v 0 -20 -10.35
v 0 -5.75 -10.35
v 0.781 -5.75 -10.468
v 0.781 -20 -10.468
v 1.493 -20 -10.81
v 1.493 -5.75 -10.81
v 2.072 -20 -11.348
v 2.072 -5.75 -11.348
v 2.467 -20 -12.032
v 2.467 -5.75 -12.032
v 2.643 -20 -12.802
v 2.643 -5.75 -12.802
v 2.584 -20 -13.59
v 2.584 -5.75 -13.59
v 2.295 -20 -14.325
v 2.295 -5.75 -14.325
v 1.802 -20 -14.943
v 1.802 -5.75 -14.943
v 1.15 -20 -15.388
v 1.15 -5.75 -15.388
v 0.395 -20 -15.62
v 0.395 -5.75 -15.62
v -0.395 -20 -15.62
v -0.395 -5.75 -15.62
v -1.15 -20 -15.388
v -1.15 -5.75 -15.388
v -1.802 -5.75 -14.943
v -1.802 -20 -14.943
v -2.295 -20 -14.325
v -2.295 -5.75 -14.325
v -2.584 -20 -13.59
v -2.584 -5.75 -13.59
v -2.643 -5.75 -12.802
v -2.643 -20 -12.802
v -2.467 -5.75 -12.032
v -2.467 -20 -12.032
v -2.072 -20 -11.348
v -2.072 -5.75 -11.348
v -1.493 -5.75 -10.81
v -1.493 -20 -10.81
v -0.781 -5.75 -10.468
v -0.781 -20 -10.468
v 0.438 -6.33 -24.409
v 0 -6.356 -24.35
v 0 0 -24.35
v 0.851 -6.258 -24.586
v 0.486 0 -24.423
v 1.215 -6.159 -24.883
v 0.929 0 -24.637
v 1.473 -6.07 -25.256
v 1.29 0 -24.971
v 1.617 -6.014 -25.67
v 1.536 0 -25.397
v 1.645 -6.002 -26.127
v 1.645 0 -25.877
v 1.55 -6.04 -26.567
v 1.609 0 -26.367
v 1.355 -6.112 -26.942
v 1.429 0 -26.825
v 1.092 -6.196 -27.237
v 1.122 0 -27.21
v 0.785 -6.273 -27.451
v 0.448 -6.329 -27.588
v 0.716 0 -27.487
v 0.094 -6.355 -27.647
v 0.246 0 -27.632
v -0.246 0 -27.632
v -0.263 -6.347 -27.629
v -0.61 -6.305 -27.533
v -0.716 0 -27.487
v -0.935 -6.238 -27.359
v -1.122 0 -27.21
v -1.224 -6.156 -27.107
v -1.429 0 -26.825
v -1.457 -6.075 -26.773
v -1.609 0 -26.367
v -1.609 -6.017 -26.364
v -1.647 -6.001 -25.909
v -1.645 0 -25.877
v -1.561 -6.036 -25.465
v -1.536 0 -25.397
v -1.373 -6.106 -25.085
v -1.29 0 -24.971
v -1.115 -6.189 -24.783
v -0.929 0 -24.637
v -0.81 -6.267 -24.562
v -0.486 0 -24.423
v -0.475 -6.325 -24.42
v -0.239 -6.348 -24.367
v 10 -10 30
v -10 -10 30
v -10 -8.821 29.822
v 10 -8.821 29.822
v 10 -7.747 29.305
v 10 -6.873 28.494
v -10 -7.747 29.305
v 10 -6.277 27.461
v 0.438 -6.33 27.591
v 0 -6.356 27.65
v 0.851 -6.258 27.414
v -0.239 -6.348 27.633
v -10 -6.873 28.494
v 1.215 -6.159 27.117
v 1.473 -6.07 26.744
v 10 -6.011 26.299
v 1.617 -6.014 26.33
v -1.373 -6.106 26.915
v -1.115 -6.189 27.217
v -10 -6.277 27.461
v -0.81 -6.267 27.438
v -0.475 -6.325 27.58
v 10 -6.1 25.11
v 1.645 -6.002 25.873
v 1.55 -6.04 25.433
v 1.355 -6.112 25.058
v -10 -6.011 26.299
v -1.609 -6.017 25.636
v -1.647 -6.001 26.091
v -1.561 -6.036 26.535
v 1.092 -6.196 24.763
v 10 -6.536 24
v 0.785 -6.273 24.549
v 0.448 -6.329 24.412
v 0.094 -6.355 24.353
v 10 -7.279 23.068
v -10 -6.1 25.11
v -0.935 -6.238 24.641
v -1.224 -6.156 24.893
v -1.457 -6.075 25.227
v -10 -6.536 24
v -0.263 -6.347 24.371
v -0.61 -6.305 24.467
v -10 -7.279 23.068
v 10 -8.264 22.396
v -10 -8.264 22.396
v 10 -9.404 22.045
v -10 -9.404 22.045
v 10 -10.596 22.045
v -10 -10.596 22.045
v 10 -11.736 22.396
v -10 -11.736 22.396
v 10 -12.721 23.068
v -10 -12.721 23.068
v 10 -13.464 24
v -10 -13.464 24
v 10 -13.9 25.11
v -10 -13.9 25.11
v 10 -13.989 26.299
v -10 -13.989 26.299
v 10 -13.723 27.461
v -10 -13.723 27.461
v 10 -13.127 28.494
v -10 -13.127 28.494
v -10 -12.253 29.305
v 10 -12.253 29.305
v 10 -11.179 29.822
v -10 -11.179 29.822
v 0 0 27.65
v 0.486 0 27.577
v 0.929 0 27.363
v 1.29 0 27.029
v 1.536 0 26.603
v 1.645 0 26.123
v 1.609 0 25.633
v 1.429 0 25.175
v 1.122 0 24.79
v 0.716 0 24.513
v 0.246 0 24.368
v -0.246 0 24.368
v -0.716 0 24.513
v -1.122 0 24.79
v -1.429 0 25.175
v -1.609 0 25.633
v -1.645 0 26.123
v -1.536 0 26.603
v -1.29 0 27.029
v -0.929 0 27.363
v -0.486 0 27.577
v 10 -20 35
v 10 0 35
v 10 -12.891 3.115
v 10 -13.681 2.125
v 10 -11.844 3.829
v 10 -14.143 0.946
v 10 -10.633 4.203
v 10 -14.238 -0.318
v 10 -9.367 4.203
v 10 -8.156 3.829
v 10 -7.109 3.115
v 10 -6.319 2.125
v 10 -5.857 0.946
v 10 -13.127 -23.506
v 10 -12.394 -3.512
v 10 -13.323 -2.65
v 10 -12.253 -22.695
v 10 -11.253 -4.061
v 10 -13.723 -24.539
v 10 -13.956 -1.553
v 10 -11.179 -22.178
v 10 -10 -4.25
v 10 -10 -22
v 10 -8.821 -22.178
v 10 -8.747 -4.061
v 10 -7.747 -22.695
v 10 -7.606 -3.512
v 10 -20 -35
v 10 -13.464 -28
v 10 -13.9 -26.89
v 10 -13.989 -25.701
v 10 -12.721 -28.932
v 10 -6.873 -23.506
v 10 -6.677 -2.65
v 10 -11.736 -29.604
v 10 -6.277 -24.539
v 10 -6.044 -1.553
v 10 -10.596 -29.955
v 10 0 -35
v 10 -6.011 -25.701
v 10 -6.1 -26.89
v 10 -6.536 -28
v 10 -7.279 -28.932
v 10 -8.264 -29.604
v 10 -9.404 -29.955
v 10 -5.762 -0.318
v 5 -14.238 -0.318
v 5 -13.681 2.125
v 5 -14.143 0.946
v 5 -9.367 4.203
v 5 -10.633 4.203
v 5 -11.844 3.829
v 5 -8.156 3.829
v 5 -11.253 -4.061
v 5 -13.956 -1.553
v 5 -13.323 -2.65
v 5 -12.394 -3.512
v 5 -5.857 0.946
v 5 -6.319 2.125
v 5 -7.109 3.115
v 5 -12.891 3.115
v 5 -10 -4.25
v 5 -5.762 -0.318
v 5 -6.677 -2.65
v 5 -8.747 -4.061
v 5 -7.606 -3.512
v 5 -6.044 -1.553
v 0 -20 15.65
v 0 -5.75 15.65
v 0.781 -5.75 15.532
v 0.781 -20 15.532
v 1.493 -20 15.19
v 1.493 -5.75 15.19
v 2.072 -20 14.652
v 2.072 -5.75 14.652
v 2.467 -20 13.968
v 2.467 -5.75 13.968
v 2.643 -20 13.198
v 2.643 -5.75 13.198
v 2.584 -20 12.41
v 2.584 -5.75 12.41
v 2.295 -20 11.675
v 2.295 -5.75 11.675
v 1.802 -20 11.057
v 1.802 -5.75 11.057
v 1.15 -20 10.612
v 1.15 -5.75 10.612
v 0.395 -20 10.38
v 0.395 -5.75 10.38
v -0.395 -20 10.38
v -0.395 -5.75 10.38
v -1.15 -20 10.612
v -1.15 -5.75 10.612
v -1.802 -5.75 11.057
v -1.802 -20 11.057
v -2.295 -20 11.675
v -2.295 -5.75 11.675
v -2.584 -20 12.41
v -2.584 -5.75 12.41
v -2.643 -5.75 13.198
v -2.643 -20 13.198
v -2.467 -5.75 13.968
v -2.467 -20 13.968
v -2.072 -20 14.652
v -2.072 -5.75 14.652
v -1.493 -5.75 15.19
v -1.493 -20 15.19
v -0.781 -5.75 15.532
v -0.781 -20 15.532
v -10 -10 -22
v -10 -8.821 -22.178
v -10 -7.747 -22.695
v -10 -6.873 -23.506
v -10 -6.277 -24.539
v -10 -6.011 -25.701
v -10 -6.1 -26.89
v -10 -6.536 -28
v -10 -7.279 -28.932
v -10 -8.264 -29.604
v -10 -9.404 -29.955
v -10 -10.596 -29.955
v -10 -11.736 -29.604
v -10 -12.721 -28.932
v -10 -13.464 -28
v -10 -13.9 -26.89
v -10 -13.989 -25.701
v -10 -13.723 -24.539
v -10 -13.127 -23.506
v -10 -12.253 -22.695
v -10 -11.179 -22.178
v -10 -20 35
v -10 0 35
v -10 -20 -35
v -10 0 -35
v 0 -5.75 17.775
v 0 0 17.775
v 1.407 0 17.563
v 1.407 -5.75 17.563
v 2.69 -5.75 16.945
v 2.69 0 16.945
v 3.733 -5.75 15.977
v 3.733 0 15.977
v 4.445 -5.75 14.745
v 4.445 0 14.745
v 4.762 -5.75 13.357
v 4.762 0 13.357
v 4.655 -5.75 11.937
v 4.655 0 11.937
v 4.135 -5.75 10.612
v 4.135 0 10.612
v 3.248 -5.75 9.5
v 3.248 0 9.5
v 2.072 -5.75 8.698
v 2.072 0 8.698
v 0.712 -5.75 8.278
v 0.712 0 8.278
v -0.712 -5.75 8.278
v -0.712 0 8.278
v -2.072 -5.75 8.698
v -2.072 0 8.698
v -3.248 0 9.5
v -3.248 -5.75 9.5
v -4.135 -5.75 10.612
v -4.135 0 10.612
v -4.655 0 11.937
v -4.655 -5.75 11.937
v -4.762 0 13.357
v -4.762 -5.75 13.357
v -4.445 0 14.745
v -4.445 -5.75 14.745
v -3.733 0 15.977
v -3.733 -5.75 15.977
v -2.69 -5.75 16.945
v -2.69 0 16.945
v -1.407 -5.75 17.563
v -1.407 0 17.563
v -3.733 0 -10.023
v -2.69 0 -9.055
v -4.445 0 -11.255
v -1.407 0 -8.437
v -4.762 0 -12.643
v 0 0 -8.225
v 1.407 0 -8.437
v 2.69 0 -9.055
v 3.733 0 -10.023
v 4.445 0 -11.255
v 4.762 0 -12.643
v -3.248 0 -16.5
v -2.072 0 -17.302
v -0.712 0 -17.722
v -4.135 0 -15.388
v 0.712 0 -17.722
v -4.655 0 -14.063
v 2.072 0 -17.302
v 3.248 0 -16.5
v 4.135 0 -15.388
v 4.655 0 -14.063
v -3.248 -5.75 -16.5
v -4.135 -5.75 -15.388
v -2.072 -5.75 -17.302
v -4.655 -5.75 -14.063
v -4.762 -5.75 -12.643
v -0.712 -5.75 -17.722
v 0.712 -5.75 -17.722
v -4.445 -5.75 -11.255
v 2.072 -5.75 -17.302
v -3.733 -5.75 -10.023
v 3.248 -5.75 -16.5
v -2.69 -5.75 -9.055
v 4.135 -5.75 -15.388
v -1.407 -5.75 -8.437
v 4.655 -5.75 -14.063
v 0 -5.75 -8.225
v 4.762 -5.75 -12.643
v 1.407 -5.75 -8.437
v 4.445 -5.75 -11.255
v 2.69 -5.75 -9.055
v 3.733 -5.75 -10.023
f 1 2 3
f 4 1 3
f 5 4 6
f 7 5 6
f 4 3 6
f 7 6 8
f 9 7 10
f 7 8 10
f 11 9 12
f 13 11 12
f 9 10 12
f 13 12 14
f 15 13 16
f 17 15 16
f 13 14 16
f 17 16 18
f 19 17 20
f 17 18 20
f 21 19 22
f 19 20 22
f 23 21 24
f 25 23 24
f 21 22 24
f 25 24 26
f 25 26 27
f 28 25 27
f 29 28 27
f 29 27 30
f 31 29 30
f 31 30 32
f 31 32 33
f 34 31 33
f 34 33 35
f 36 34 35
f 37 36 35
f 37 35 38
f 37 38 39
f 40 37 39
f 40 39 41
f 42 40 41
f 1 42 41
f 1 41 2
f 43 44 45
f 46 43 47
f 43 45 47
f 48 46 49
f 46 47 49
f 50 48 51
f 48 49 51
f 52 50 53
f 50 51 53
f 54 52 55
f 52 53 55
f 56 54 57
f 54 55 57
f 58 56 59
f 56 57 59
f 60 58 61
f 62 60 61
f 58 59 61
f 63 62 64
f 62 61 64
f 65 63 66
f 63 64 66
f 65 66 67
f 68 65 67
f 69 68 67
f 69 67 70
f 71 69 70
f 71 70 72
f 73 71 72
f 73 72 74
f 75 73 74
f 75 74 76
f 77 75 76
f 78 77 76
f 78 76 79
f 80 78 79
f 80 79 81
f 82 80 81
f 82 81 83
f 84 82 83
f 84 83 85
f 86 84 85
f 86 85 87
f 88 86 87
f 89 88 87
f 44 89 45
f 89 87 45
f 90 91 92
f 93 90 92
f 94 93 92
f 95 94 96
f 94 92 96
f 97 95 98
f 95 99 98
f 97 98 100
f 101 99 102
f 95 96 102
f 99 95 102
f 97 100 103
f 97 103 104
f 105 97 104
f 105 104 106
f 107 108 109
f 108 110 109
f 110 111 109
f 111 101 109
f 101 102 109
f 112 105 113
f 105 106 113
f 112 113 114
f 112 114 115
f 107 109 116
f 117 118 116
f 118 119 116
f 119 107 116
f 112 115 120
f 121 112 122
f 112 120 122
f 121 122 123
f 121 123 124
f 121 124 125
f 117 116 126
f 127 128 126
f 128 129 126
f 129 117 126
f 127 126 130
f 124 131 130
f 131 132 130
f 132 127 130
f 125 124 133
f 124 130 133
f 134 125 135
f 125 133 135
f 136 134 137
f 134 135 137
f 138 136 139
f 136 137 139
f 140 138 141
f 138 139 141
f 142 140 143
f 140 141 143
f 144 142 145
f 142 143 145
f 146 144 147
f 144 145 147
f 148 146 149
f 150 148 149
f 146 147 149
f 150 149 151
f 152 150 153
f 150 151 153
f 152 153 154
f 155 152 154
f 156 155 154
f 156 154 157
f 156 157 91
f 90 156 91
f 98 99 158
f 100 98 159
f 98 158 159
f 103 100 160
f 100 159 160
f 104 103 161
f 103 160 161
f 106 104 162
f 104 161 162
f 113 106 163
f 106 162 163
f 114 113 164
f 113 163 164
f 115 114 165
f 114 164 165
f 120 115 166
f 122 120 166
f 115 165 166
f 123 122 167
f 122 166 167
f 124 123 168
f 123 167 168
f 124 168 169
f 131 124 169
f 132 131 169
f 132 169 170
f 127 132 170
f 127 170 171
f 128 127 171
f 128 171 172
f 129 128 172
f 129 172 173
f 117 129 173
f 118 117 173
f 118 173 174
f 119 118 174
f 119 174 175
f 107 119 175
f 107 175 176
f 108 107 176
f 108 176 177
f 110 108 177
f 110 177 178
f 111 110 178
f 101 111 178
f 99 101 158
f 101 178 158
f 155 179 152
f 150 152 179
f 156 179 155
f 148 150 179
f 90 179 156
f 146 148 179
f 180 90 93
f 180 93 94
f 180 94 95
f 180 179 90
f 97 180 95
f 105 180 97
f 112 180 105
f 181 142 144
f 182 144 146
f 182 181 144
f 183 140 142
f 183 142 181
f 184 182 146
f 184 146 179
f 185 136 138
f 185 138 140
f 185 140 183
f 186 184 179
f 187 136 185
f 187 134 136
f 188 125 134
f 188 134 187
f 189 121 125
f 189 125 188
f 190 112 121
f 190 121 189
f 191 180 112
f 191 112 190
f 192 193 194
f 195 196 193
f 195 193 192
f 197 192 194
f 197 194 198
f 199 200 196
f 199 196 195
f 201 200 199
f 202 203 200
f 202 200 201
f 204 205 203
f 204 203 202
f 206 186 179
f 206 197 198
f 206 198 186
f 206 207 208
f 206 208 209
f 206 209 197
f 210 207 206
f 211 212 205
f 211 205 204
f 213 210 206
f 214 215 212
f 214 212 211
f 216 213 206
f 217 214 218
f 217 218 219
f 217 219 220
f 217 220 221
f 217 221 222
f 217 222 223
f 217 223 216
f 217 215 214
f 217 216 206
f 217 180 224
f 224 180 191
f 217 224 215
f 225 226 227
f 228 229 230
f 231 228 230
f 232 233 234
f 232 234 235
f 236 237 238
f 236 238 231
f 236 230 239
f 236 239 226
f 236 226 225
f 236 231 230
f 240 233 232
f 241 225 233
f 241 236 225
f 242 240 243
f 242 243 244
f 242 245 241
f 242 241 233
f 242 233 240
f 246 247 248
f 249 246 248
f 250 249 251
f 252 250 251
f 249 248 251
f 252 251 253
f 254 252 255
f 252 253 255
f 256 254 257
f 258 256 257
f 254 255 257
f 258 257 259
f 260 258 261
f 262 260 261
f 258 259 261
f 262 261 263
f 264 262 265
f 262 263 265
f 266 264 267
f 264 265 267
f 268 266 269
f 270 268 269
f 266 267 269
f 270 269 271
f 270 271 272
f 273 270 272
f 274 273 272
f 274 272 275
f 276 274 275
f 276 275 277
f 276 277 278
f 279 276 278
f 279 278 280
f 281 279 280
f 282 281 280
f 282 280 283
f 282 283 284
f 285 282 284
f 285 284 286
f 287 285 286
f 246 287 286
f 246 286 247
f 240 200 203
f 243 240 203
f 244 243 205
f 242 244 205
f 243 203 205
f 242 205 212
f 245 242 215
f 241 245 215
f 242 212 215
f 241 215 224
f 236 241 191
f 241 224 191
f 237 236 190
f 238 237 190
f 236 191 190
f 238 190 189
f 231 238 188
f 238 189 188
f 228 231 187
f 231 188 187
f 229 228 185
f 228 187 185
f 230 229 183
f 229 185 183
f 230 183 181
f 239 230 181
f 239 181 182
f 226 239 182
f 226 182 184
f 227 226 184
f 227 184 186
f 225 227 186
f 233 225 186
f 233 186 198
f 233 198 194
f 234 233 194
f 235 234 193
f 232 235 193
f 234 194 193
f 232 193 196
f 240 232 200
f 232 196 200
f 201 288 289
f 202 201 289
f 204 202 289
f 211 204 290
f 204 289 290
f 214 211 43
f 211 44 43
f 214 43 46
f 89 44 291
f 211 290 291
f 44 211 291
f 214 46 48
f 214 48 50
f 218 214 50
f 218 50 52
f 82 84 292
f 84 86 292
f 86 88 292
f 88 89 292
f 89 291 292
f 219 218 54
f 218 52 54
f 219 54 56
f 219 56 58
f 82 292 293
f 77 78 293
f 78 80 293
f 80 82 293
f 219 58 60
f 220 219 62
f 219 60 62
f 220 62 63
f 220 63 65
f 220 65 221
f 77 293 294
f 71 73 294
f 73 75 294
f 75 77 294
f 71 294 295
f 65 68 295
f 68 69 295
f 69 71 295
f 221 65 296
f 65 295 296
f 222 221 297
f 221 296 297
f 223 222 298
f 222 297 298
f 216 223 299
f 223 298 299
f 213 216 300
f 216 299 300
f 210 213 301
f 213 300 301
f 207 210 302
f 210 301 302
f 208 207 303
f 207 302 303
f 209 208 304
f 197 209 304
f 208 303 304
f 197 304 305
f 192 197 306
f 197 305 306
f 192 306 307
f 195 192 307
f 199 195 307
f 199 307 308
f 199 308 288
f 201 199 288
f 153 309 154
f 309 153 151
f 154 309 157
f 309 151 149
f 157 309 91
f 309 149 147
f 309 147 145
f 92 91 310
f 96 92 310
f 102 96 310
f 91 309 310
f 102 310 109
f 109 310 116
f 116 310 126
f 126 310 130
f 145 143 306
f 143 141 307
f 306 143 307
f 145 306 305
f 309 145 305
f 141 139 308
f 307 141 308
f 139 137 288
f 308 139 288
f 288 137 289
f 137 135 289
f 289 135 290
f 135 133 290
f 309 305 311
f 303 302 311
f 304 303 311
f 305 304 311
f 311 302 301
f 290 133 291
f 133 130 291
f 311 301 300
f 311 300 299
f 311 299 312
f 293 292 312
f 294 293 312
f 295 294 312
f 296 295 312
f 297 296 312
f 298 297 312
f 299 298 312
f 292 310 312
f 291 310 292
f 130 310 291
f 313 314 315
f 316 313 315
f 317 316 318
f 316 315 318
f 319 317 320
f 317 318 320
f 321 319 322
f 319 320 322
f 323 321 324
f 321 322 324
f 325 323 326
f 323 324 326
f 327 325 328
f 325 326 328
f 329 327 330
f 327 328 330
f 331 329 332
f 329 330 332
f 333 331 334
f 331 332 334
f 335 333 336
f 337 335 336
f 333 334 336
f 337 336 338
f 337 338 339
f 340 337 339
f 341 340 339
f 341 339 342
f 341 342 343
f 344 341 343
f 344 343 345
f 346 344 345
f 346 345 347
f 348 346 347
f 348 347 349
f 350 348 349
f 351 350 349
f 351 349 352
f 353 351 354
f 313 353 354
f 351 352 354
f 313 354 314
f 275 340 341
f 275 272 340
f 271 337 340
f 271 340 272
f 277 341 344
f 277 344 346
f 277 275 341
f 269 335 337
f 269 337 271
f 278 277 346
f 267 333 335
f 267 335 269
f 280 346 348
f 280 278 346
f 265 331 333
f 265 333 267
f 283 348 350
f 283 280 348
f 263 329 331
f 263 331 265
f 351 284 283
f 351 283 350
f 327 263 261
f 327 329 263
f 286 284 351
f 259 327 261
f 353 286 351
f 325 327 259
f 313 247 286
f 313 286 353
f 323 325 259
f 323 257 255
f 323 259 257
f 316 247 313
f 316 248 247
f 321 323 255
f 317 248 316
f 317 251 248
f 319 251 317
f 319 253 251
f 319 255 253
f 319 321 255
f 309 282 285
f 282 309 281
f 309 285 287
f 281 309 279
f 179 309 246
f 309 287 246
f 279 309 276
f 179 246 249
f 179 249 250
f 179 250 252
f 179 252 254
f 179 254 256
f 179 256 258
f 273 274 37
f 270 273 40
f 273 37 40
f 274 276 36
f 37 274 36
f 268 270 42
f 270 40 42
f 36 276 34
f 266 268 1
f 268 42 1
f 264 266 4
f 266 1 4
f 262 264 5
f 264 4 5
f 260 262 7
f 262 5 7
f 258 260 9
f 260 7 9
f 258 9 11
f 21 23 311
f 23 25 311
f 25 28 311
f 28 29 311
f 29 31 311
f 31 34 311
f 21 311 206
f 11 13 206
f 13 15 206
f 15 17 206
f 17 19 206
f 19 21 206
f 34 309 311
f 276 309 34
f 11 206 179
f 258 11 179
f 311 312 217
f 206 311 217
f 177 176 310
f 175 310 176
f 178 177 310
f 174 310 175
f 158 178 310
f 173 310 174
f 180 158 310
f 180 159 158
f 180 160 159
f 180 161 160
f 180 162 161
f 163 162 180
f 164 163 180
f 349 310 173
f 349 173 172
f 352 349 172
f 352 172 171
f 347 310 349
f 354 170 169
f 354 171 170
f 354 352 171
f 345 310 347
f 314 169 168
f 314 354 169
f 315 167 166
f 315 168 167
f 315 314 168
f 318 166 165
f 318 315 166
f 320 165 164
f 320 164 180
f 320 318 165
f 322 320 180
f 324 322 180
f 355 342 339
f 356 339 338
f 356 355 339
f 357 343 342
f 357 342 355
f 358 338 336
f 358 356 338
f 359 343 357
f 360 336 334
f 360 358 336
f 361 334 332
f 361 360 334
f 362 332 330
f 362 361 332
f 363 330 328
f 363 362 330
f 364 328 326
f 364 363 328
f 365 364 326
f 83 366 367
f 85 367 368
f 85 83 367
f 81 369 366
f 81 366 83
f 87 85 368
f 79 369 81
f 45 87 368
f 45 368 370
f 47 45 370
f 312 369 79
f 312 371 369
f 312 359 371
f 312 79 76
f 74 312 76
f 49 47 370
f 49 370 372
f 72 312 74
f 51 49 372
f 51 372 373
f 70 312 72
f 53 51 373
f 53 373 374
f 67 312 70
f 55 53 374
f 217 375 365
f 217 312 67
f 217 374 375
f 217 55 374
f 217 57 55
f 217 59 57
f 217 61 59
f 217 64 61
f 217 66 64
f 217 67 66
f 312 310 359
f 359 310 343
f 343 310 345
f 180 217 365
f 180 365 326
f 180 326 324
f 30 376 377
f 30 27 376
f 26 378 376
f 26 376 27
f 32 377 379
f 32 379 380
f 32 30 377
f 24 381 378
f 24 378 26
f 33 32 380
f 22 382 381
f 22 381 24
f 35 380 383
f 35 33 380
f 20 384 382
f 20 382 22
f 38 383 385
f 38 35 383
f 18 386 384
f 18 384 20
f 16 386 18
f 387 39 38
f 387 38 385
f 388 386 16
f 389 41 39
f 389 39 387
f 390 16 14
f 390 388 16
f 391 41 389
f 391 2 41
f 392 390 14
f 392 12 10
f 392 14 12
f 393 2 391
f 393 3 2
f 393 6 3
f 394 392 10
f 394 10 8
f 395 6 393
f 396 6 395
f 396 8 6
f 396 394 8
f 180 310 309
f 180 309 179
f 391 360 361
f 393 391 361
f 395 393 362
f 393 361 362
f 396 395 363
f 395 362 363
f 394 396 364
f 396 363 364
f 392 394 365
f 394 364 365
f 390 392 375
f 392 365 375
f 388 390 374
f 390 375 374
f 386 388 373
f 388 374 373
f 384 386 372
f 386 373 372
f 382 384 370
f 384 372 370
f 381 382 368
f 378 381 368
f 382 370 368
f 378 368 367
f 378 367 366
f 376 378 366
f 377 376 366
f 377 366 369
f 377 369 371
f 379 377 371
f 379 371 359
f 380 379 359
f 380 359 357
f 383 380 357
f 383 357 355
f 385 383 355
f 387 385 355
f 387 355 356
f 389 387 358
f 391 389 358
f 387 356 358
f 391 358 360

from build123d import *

# Parameters (mm, degrees)
ESBO_O1_W             = 20
ESBO_O1_H             = 70
FLANGE_BASE1_DEPTH    = 20
ESBO_O2_R             = 4.775
CORTE_EXTRUS_O1_DEPTH = 5.75
ESBO_O3_R             = 2.65
CORTE_EXTRUS_O2_DEPTH = 40.090440008
ESBO_O4_R             = 4
CORTE_EXTRUS_O3_DEPTH = 46
ESBO_O6_R             = 1.65
CORTE_EXTRUS_O4_DEPTH = 10
ESBO_O8_R             = 4.25
CORTE_EXTRUS_O6_DEPTH = 5


# Sheet-metal steps are written as plain solids
with BuildPart() as part:
    # Esboço1 → Flange-base1 (new body)
    with BuildSketch(Plane(origin=(0, 0, 0), x_dir=(1, 0, 0), z_dir=(0, 1, 0))):
        Rectangle(ESBO_O1_W, ESBO_O1_H)
    extrude(amount=-FLANGE_BASE1_DEPTH)

    # Esboço2 → Corte-extrusão1 (cut)
    with BuildSketch(Plane(origin=(0, 0, 0), x_dir=(1, 0, 0), z_dir=(0, 1, 0))):
        with Locations(Location((0, 13, 0), (0, 0, 270))):
            Circle(ESBO_O2_R)
        with Locations(Location((0, -13, 0), (0, 0, 270))):
            Circle(ESBO_O2_R)
    extrude(amount=-CORTE_EXTRUS_O1_DEPTH, mode=Mode.SUBTRACT)

    # Esboço3 → Corte-extrusão2 (cut, through all)
    with BuildSketch(Plane(origin=(0, -5.75, 0), x_dir=(1, 0, 0), z_dir=(0, 1, 0))):
        with Locations(Location((0, 13, 0), (0, 0, 270))):
            Circle(ESBO_O3_R)
        with Locations(Location((0, -13, 0), (0, 0, 270))):
            Circle(ESBO_O3_R)
    extrude(amount=-CORTE_EXTRUS_O2_DEPTH, mode=Mode.SUBTRACT)

    # Esboço4 → Corte-extrusão3 (cut, through all)
    with BuildSketch(Plane.ZY.offset(10)):
        with Locations((26, -10)):
            Circle(ESBO_O4_R)
        with Locations((-26, -10)):
            Circle(ESBO_O4_R)
    extrude(amount=-CORTE_EXTRUS_O3_DEPTH, mode=Mode.SUBTRACT)

    # Esboço6 → Corte-extrusão4 (cut)
    with BuildSketch(Plane(origin=(0, 0, 0), x_dir=(1, 0, 0), z_dir=(0, 1, 0))):
        with Locations(Location((0, -26, 0), (0, 0, 270))):
            Circle(ESBO_O6_R)
        with Locations(Location((0, 26, 0), (0, 0, 270))):
            Circle(ESBO_O6_R)
    extrude(amount=-CORTE_EXTRUS_O4_DEPTH, mode=Mode.SUBTRACT)

    # Esboço8 → Corte-extrusão6 (cut)
    with BuildSketch(Plane(origin=(10, 0, 0), x_dir=(0, 0, -1), z_dir=(1, 0, 0))):
        with Locations((0, -10)):
            Circle(ESBO_O8_R)
    extrude(amount=-CORTE_EXTRUS_O6_DEPTH, mode=Mode.SUBTRACT)


solid = part.part
